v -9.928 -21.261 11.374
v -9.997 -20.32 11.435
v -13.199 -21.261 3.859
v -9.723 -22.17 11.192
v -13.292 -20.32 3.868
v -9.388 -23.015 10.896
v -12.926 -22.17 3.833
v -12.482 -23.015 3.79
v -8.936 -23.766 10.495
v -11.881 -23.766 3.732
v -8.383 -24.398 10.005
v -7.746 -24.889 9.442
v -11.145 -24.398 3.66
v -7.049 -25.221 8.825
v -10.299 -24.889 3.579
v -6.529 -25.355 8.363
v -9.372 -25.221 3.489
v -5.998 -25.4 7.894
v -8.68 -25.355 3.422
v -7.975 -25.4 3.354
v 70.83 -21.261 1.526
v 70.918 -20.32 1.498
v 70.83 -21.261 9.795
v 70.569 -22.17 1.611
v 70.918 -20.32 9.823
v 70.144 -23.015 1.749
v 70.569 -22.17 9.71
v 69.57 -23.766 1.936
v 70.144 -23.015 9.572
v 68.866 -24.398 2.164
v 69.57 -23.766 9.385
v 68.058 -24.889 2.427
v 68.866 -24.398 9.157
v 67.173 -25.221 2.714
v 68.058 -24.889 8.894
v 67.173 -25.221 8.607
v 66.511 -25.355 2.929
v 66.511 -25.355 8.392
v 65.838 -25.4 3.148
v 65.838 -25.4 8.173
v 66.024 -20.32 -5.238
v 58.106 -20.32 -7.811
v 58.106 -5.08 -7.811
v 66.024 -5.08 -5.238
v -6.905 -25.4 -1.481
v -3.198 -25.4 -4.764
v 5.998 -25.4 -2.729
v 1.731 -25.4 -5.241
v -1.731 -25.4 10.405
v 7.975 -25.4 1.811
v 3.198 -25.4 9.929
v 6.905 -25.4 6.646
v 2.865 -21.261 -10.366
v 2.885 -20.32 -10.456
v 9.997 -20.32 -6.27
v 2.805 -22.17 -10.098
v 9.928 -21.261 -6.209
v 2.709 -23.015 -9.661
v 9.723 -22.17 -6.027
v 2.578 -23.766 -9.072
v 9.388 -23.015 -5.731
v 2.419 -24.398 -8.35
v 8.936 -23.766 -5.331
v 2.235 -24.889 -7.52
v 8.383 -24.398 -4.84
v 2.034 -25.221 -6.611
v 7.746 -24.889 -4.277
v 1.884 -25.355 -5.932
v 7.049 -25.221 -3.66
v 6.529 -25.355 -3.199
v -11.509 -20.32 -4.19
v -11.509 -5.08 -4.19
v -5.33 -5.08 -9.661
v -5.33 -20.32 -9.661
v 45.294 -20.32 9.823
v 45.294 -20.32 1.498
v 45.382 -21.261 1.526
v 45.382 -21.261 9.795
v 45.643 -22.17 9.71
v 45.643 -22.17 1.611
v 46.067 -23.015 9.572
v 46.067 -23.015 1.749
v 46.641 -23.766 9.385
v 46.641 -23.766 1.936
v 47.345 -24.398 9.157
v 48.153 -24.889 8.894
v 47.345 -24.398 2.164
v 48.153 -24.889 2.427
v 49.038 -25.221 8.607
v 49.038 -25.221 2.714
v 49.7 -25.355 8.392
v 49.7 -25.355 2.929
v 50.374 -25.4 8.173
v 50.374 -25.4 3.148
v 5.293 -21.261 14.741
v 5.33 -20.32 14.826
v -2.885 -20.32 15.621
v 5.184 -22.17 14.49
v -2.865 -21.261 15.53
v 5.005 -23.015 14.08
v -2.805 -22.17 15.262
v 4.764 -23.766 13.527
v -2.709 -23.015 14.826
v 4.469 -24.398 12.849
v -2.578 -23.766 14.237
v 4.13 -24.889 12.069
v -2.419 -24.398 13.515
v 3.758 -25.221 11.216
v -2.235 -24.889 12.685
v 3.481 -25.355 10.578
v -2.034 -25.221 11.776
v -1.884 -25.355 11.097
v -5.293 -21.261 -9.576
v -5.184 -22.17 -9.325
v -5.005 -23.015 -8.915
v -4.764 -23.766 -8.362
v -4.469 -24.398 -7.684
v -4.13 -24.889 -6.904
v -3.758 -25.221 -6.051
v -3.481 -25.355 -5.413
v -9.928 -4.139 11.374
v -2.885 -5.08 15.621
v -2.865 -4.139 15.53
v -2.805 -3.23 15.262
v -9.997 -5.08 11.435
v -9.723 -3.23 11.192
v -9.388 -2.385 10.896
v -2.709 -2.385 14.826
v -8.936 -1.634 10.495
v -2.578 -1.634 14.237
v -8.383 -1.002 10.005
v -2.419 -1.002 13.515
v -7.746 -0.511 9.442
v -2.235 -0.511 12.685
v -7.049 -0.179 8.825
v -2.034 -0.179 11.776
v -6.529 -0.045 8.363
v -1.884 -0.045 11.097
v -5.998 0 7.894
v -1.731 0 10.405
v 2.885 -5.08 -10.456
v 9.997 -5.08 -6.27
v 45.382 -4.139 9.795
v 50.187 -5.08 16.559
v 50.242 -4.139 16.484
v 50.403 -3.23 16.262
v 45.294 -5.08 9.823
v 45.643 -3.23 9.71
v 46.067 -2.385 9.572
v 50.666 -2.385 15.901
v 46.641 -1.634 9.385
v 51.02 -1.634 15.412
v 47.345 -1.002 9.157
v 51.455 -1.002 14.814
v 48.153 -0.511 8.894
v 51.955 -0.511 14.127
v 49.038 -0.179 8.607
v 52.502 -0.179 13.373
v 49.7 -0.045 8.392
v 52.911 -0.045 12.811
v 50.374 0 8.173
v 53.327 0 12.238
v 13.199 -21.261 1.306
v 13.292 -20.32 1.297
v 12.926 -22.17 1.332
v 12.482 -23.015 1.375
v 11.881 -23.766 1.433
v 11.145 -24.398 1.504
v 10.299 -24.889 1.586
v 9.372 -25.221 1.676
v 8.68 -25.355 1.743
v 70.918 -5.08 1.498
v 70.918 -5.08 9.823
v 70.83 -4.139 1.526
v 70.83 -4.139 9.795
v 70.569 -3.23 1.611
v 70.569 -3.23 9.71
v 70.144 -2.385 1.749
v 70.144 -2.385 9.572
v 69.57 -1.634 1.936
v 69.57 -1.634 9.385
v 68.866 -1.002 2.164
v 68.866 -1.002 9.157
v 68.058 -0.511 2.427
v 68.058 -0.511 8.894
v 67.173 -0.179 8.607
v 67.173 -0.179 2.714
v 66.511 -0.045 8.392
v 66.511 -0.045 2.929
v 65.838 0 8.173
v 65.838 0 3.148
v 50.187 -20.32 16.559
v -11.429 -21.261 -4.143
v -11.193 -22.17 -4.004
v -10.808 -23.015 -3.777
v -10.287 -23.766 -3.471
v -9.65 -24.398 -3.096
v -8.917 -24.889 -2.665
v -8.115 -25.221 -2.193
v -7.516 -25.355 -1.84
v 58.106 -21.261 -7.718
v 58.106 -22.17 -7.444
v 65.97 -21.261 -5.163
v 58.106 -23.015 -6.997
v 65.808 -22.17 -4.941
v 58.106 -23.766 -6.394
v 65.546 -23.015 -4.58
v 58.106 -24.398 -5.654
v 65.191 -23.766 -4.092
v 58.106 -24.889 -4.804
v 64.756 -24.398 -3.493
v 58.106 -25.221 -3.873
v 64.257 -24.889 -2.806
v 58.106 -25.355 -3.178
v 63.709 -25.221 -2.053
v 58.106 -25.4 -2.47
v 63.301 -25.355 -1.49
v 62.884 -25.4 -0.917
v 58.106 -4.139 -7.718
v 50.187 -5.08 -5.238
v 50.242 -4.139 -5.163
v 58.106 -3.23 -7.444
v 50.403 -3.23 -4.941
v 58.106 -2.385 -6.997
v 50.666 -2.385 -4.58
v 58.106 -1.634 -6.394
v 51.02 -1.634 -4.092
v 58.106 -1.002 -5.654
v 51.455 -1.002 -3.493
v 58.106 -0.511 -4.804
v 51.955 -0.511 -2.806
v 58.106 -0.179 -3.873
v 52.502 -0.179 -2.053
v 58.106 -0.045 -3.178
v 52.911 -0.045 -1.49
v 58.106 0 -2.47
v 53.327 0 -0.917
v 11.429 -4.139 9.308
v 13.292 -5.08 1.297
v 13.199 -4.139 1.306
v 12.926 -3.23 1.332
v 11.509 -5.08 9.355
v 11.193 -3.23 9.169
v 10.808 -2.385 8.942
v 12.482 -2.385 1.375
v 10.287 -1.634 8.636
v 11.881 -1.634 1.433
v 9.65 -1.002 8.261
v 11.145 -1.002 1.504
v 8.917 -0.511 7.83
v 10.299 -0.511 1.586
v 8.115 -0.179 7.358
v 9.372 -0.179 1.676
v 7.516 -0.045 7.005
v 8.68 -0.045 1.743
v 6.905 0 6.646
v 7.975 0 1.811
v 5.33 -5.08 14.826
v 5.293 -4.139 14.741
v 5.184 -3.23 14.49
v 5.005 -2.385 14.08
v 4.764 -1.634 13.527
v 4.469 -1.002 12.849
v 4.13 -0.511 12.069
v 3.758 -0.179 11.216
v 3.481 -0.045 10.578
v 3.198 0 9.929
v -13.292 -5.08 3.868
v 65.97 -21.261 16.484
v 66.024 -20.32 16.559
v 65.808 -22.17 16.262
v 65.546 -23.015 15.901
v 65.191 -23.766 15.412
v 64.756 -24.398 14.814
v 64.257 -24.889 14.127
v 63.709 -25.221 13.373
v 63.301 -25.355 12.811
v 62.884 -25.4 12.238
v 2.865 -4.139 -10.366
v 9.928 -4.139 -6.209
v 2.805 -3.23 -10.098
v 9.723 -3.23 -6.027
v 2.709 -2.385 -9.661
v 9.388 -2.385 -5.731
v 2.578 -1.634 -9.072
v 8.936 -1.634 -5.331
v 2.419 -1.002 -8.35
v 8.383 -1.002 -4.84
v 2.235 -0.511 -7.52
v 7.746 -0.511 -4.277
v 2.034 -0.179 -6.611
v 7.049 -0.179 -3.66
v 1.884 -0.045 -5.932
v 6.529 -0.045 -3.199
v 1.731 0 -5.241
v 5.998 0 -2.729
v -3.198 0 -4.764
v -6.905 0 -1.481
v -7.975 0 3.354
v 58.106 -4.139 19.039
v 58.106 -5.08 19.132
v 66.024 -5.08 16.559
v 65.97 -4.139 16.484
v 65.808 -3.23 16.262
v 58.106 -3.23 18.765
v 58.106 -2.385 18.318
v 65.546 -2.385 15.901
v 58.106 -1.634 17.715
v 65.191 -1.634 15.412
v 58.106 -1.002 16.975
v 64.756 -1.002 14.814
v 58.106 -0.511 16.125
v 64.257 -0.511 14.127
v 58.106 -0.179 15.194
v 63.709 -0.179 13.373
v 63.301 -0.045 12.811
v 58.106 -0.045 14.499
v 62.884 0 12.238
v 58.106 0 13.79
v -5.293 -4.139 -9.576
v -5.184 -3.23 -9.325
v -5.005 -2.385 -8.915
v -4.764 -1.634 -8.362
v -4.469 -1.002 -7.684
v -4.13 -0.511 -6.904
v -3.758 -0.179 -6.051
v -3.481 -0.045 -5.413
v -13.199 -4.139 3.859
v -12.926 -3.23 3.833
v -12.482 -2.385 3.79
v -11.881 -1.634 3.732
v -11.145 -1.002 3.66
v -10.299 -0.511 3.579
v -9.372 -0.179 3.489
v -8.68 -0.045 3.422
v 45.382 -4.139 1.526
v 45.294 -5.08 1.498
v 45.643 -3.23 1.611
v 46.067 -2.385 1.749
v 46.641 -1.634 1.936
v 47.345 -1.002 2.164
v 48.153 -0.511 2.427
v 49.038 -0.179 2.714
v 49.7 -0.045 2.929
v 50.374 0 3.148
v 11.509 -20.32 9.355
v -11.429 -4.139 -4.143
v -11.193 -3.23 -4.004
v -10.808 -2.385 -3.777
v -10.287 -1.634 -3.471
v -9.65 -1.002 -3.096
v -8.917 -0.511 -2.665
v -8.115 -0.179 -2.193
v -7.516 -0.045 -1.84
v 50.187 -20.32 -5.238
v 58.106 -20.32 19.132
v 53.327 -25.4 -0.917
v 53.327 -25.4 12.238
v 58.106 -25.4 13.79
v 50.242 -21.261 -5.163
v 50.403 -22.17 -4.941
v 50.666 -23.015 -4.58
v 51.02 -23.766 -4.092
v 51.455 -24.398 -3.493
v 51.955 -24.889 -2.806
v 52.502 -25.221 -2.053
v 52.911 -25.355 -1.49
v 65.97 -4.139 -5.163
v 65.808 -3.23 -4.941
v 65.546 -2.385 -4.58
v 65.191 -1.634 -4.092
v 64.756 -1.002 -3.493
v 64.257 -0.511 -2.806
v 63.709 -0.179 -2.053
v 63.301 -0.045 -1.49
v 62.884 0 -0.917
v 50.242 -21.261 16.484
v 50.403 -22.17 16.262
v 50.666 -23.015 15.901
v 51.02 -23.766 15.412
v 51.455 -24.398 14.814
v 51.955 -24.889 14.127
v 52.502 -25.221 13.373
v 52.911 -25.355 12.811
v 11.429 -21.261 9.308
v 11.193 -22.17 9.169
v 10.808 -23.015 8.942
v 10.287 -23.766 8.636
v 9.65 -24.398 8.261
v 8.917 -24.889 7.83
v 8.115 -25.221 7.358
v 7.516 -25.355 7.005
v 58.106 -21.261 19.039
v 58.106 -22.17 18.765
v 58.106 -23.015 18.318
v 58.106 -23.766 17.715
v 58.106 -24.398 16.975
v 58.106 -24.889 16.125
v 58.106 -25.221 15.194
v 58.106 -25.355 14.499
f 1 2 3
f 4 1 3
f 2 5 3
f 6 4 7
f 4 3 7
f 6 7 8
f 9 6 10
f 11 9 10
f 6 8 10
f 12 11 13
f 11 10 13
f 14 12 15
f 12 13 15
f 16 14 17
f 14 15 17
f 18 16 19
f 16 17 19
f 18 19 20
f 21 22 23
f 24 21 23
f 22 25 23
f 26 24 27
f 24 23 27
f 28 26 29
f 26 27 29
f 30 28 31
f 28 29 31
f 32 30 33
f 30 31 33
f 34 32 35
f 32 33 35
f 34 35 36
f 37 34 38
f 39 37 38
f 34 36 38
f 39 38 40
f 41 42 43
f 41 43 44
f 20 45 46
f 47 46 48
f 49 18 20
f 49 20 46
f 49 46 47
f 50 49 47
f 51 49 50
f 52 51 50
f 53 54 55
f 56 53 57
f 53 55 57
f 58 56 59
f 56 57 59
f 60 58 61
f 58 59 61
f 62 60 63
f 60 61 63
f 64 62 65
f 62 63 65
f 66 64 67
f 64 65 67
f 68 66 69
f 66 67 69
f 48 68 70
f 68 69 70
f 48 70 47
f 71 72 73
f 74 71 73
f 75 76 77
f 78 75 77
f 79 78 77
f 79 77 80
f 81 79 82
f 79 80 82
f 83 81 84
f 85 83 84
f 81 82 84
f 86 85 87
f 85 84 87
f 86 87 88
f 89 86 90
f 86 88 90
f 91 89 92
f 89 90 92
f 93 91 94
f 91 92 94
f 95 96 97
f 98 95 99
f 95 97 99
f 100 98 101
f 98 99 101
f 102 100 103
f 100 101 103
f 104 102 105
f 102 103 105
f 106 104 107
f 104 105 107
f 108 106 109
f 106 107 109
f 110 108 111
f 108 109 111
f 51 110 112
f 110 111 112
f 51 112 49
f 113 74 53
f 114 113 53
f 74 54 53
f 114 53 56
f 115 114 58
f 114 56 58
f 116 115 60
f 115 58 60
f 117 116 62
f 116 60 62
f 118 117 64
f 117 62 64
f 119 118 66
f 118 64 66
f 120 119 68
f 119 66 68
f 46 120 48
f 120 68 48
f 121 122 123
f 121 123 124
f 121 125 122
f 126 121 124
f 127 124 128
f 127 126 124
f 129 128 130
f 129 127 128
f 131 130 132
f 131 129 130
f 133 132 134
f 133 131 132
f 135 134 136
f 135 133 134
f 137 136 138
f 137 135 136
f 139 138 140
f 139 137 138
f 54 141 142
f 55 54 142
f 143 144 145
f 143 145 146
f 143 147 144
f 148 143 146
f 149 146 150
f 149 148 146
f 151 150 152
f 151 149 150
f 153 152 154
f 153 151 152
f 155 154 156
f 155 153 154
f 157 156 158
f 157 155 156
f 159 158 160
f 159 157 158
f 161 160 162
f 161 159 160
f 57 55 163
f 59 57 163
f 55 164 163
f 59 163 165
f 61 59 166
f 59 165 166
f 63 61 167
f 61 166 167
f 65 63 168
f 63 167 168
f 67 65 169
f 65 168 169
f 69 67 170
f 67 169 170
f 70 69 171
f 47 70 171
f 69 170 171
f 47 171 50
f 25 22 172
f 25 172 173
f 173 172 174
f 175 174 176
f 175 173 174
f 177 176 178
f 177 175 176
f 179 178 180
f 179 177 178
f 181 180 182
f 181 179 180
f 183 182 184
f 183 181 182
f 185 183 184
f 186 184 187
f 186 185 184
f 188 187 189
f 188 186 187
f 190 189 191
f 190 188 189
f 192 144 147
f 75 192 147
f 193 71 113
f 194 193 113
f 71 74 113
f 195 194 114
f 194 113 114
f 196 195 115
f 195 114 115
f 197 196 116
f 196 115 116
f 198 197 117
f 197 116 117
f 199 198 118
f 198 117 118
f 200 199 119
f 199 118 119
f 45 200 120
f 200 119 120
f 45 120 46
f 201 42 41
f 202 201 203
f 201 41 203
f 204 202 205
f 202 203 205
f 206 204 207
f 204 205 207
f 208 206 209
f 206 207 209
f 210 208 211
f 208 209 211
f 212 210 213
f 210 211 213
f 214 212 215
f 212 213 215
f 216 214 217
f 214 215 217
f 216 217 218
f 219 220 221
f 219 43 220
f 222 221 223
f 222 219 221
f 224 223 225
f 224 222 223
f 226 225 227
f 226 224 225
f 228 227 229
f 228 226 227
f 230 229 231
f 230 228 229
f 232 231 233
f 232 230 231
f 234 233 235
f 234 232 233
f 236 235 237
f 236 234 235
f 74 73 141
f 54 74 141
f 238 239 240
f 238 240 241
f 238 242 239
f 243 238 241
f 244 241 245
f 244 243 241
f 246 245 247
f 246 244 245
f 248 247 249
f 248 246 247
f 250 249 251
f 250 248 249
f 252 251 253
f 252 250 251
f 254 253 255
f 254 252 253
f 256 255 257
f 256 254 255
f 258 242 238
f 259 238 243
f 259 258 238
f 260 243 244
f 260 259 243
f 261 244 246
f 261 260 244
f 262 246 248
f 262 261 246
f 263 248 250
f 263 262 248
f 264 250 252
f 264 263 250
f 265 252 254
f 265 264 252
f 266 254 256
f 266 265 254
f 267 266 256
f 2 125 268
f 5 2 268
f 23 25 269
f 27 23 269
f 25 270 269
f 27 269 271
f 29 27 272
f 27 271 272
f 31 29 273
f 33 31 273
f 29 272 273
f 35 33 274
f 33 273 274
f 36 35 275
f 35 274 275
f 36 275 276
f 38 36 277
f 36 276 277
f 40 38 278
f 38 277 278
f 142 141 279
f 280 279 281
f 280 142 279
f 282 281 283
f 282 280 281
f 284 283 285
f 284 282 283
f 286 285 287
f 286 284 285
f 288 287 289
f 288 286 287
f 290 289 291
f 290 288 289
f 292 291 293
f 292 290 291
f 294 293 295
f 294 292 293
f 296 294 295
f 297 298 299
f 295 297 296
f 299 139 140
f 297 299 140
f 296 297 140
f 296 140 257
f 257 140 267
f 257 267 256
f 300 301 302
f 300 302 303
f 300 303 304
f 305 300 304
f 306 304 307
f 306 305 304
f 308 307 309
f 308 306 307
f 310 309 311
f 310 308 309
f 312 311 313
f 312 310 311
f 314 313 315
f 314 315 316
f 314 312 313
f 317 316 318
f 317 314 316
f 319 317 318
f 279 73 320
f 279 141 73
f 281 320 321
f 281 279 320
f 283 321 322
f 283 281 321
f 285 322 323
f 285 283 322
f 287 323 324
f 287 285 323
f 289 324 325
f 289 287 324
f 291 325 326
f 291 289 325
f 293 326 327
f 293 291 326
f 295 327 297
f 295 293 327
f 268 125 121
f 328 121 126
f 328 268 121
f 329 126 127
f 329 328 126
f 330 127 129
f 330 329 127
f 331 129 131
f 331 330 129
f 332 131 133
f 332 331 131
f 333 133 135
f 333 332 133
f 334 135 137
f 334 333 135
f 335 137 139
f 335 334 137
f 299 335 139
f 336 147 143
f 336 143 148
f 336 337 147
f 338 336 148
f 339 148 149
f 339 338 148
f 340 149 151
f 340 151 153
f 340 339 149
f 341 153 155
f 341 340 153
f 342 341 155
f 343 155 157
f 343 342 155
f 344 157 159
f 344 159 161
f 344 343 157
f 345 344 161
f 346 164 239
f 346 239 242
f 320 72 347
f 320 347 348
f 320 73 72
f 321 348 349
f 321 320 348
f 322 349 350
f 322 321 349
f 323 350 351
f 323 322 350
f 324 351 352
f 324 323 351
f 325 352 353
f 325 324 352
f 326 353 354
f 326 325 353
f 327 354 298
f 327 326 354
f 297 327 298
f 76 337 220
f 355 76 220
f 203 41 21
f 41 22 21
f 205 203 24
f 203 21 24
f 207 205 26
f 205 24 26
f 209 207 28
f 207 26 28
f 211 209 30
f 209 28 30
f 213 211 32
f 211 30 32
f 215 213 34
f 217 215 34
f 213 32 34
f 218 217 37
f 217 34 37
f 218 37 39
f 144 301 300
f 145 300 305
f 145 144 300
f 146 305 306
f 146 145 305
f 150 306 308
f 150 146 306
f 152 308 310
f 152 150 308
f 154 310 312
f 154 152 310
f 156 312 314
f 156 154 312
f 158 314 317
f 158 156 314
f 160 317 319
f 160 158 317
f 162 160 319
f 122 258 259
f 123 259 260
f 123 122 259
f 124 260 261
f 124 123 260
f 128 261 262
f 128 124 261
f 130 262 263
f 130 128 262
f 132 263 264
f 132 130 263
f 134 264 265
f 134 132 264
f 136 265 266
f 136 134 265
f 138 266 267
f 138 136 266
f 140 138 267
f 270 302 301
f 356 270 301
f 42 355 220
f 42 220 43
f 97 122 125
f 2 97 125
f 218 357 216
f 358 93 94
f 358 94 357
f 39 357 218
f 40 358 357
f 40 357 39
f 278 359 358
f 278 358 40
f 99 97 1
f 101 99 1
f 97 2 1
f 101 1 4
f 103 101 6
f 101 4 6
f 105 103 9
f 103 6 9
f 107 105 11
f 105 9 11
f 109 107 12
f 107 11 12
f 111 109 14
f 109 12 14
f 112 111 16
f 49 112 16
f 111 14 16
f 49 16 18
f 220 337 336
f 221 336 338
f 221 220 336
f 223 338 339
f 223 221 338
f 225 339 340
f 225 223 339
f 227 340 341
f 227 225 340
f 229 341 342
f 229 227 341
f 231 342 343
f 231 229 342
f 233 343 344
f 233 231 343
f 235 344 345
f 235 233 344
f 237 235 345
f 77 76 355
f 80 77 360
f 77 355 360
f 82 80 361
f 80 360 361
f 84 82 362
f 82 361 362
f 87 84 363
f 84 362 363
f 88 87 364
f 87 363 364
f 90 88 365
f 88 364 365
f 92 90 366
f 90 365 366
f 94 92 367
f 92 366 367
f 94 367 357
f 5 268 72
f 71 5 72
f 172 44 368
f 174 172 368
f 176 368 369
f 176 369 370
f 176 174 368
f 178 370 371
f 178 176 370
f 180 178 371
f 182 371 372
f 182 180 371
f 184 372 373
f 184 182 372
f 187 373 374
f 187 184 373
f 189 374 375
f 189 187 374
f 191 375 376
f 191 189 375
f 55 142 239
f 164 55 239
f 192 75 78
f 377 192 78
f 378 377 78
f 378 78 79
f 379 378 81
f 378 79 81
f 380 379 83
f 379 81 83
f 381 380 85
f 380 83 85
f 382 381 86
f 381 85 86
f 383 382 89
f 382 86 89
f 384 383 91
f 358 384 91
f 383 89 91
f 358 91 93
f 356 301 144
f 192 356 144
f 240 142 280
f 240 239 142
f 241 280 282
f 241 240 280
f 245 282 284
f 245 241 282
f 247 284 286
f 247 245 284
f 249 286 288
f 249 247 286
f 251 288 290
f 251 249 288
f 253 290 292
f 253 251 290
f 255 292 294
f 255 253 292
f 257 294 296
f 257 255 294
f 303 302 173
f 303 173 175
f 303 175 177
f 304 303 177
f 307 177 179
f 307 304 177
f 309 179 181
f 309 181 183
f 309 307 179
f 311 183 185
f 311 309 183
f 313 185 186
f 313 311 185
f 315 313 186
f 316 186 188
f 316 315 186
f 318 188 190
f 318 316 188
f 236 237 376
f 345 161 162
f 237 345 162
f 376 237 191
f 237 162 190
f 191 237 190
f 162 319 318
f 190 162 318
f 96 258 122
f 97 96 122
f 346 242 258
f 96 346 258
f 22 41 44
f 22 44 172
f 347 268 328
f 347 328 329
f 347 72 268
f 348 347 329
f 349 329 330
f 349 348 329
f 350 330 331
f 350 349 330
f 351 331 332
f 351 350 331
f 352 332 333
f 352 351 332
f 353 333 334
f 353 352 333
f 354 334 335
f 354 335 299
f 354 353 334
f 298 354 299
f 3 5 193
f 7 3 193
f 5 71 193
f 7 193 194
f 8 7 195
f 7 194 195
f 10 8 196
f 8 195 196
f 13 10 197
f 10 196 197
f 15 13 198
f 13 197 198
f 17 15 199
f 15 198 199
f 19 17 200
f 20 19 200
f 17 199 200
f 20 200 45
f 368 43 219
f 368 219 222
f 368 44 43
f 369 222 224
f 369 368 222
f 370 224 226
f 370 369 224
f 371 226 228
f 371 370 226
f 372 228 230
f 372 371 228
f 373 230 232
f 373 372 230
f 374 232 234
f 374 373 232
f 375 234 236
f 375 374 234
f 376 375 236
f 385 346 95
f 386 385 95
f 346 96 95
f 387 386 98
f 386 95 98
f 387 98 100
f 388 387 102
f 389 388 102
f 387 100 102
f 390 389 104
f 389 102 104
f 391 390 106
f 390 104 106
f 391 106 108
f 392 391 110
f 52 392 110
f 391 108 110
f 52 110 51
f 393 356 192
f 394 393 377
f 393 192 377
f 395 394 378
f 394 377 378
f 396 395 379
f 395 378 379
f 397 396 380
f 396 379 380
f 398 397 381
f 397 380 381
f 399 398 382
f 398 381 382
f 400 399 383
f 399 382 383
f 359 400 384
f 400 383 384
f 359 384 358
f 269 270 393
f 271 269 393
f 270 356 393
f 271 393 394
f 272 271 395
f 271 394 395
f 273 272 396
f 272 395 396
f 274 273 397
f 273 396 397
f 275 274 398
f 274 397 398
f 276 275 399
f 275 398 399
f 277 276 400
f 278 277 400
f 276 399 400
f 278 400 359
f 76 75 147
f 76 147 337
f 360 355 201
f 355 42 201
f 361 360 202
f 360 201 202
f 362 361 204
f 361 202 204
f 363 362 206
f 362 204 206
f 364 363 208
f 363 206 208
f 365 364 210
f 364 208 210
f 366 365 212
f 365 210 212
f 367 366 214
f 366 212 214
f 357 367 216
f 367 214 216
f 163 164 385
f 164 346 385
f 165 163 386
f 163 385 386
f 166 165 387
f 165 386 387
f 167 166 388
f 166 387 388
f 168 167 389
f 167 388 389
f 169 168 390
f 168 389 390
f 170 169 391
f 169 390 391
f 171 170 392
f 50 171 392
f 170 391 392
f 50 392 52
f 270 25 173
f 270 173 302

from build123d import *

# Parameters (mm, degrees)
F1_DEPTH = 25.4
F2_R     = 5.08


with BuildPart() as f1:
    # F0 (on Front) → F1 (new body)
    with BuildSketch(Plane.XZ):
        Polygon((13.291539, 1.296762), (11.508753, 9.354866), (5.330014, 14.826113), (-2.884608, 15.620673), (-9.997409, 11.435052), (-13.291539, 3.868014), (-11.508753, -4.190089), (-5.330014, -9.661336), (2.884608, -10.455897), (9.997409, -6.270275), align=None)
        Polygon((70.917666, 1.497548), (70.917666, 9.823325), (66.023898, 16.559019), (58.105614, 19.131826), (50.18733, 16.559019), (45.293561, 9.823325), (45.293561, 1.497548), (50.18733, -5.238146), (58.105614, -7.810953), (66.023898, -5.238146), align=None)
    extrude(amount=F1_DEPTH)

    # F2
    f2_edges = [f1.edges().sort_by_distance(p)[0] for p in [
        (6.441009, -25.4, -8.363086),
        (11.644474, -25.4, -2.486756),
        (12.400146, -25.4, 5.325814),
        (8.419384, -25.4, 12.090489),
        (1.222703, -25.4, 15.223393),
        (-6.441009, -25.4, 13.527863),
        (-11.644474, -25.4, 7.651533),
        (-12.400146, -25.4, -0.161037),
        (-8.419384, -25.4, -6.925712),
        (-1.222703, -25.4, -10.058616),
        (70.917666, -25.4, 5.660437),
        (68.470782, -25.4, 13.191172),
        (62.064756, -25.4, 17.845423),
        (54.146472, -25.4, 17.845423),
        (47.740446, -25.4, 13.191172),
        (45.293561, -25.4, 5.660437),
        (47.740446, -25.4, -1.870299),
        (54.146472, -25.4, -6.524549),
        (62.064756, -25.4, -6.524549),
        (68.470782, -25.4, -1.870299),
        (6.441009, 0, -8.363086),
        (11.644474, 0, -2.486756),
        (12.400146, 0, 5.325814),
        (8.419384, 0, 12.090489),
        (1.222703, 0, 15.223393),
        (-6.441009, 0, 13.527863),
        (-11.644474, 0, 7.651533),
        (-12.400146, 0, -0.161037),
        (-8.419384, 0, -6.925712),
        (-1.222703, 0, -10.058616),
        (70.917666, 0, 5.660437),
        (68.470782, 0, 13.191172),
        (62.064756, 0, 17.845423),
        (54.146472, 0, 17.845423),
        (47.740446, 0, 13.191172),
        (45.293561, 0, 5.660437),
        (47.740446, 0, -1.870299),
        (54.146472, 0, -6.524549),
        (62.064756, 0, -6.524549),
        (68.470782, 0, -1.870299),
    ]]
    fillet(f2_edges, radius=F2_R)


solid = f1.part
